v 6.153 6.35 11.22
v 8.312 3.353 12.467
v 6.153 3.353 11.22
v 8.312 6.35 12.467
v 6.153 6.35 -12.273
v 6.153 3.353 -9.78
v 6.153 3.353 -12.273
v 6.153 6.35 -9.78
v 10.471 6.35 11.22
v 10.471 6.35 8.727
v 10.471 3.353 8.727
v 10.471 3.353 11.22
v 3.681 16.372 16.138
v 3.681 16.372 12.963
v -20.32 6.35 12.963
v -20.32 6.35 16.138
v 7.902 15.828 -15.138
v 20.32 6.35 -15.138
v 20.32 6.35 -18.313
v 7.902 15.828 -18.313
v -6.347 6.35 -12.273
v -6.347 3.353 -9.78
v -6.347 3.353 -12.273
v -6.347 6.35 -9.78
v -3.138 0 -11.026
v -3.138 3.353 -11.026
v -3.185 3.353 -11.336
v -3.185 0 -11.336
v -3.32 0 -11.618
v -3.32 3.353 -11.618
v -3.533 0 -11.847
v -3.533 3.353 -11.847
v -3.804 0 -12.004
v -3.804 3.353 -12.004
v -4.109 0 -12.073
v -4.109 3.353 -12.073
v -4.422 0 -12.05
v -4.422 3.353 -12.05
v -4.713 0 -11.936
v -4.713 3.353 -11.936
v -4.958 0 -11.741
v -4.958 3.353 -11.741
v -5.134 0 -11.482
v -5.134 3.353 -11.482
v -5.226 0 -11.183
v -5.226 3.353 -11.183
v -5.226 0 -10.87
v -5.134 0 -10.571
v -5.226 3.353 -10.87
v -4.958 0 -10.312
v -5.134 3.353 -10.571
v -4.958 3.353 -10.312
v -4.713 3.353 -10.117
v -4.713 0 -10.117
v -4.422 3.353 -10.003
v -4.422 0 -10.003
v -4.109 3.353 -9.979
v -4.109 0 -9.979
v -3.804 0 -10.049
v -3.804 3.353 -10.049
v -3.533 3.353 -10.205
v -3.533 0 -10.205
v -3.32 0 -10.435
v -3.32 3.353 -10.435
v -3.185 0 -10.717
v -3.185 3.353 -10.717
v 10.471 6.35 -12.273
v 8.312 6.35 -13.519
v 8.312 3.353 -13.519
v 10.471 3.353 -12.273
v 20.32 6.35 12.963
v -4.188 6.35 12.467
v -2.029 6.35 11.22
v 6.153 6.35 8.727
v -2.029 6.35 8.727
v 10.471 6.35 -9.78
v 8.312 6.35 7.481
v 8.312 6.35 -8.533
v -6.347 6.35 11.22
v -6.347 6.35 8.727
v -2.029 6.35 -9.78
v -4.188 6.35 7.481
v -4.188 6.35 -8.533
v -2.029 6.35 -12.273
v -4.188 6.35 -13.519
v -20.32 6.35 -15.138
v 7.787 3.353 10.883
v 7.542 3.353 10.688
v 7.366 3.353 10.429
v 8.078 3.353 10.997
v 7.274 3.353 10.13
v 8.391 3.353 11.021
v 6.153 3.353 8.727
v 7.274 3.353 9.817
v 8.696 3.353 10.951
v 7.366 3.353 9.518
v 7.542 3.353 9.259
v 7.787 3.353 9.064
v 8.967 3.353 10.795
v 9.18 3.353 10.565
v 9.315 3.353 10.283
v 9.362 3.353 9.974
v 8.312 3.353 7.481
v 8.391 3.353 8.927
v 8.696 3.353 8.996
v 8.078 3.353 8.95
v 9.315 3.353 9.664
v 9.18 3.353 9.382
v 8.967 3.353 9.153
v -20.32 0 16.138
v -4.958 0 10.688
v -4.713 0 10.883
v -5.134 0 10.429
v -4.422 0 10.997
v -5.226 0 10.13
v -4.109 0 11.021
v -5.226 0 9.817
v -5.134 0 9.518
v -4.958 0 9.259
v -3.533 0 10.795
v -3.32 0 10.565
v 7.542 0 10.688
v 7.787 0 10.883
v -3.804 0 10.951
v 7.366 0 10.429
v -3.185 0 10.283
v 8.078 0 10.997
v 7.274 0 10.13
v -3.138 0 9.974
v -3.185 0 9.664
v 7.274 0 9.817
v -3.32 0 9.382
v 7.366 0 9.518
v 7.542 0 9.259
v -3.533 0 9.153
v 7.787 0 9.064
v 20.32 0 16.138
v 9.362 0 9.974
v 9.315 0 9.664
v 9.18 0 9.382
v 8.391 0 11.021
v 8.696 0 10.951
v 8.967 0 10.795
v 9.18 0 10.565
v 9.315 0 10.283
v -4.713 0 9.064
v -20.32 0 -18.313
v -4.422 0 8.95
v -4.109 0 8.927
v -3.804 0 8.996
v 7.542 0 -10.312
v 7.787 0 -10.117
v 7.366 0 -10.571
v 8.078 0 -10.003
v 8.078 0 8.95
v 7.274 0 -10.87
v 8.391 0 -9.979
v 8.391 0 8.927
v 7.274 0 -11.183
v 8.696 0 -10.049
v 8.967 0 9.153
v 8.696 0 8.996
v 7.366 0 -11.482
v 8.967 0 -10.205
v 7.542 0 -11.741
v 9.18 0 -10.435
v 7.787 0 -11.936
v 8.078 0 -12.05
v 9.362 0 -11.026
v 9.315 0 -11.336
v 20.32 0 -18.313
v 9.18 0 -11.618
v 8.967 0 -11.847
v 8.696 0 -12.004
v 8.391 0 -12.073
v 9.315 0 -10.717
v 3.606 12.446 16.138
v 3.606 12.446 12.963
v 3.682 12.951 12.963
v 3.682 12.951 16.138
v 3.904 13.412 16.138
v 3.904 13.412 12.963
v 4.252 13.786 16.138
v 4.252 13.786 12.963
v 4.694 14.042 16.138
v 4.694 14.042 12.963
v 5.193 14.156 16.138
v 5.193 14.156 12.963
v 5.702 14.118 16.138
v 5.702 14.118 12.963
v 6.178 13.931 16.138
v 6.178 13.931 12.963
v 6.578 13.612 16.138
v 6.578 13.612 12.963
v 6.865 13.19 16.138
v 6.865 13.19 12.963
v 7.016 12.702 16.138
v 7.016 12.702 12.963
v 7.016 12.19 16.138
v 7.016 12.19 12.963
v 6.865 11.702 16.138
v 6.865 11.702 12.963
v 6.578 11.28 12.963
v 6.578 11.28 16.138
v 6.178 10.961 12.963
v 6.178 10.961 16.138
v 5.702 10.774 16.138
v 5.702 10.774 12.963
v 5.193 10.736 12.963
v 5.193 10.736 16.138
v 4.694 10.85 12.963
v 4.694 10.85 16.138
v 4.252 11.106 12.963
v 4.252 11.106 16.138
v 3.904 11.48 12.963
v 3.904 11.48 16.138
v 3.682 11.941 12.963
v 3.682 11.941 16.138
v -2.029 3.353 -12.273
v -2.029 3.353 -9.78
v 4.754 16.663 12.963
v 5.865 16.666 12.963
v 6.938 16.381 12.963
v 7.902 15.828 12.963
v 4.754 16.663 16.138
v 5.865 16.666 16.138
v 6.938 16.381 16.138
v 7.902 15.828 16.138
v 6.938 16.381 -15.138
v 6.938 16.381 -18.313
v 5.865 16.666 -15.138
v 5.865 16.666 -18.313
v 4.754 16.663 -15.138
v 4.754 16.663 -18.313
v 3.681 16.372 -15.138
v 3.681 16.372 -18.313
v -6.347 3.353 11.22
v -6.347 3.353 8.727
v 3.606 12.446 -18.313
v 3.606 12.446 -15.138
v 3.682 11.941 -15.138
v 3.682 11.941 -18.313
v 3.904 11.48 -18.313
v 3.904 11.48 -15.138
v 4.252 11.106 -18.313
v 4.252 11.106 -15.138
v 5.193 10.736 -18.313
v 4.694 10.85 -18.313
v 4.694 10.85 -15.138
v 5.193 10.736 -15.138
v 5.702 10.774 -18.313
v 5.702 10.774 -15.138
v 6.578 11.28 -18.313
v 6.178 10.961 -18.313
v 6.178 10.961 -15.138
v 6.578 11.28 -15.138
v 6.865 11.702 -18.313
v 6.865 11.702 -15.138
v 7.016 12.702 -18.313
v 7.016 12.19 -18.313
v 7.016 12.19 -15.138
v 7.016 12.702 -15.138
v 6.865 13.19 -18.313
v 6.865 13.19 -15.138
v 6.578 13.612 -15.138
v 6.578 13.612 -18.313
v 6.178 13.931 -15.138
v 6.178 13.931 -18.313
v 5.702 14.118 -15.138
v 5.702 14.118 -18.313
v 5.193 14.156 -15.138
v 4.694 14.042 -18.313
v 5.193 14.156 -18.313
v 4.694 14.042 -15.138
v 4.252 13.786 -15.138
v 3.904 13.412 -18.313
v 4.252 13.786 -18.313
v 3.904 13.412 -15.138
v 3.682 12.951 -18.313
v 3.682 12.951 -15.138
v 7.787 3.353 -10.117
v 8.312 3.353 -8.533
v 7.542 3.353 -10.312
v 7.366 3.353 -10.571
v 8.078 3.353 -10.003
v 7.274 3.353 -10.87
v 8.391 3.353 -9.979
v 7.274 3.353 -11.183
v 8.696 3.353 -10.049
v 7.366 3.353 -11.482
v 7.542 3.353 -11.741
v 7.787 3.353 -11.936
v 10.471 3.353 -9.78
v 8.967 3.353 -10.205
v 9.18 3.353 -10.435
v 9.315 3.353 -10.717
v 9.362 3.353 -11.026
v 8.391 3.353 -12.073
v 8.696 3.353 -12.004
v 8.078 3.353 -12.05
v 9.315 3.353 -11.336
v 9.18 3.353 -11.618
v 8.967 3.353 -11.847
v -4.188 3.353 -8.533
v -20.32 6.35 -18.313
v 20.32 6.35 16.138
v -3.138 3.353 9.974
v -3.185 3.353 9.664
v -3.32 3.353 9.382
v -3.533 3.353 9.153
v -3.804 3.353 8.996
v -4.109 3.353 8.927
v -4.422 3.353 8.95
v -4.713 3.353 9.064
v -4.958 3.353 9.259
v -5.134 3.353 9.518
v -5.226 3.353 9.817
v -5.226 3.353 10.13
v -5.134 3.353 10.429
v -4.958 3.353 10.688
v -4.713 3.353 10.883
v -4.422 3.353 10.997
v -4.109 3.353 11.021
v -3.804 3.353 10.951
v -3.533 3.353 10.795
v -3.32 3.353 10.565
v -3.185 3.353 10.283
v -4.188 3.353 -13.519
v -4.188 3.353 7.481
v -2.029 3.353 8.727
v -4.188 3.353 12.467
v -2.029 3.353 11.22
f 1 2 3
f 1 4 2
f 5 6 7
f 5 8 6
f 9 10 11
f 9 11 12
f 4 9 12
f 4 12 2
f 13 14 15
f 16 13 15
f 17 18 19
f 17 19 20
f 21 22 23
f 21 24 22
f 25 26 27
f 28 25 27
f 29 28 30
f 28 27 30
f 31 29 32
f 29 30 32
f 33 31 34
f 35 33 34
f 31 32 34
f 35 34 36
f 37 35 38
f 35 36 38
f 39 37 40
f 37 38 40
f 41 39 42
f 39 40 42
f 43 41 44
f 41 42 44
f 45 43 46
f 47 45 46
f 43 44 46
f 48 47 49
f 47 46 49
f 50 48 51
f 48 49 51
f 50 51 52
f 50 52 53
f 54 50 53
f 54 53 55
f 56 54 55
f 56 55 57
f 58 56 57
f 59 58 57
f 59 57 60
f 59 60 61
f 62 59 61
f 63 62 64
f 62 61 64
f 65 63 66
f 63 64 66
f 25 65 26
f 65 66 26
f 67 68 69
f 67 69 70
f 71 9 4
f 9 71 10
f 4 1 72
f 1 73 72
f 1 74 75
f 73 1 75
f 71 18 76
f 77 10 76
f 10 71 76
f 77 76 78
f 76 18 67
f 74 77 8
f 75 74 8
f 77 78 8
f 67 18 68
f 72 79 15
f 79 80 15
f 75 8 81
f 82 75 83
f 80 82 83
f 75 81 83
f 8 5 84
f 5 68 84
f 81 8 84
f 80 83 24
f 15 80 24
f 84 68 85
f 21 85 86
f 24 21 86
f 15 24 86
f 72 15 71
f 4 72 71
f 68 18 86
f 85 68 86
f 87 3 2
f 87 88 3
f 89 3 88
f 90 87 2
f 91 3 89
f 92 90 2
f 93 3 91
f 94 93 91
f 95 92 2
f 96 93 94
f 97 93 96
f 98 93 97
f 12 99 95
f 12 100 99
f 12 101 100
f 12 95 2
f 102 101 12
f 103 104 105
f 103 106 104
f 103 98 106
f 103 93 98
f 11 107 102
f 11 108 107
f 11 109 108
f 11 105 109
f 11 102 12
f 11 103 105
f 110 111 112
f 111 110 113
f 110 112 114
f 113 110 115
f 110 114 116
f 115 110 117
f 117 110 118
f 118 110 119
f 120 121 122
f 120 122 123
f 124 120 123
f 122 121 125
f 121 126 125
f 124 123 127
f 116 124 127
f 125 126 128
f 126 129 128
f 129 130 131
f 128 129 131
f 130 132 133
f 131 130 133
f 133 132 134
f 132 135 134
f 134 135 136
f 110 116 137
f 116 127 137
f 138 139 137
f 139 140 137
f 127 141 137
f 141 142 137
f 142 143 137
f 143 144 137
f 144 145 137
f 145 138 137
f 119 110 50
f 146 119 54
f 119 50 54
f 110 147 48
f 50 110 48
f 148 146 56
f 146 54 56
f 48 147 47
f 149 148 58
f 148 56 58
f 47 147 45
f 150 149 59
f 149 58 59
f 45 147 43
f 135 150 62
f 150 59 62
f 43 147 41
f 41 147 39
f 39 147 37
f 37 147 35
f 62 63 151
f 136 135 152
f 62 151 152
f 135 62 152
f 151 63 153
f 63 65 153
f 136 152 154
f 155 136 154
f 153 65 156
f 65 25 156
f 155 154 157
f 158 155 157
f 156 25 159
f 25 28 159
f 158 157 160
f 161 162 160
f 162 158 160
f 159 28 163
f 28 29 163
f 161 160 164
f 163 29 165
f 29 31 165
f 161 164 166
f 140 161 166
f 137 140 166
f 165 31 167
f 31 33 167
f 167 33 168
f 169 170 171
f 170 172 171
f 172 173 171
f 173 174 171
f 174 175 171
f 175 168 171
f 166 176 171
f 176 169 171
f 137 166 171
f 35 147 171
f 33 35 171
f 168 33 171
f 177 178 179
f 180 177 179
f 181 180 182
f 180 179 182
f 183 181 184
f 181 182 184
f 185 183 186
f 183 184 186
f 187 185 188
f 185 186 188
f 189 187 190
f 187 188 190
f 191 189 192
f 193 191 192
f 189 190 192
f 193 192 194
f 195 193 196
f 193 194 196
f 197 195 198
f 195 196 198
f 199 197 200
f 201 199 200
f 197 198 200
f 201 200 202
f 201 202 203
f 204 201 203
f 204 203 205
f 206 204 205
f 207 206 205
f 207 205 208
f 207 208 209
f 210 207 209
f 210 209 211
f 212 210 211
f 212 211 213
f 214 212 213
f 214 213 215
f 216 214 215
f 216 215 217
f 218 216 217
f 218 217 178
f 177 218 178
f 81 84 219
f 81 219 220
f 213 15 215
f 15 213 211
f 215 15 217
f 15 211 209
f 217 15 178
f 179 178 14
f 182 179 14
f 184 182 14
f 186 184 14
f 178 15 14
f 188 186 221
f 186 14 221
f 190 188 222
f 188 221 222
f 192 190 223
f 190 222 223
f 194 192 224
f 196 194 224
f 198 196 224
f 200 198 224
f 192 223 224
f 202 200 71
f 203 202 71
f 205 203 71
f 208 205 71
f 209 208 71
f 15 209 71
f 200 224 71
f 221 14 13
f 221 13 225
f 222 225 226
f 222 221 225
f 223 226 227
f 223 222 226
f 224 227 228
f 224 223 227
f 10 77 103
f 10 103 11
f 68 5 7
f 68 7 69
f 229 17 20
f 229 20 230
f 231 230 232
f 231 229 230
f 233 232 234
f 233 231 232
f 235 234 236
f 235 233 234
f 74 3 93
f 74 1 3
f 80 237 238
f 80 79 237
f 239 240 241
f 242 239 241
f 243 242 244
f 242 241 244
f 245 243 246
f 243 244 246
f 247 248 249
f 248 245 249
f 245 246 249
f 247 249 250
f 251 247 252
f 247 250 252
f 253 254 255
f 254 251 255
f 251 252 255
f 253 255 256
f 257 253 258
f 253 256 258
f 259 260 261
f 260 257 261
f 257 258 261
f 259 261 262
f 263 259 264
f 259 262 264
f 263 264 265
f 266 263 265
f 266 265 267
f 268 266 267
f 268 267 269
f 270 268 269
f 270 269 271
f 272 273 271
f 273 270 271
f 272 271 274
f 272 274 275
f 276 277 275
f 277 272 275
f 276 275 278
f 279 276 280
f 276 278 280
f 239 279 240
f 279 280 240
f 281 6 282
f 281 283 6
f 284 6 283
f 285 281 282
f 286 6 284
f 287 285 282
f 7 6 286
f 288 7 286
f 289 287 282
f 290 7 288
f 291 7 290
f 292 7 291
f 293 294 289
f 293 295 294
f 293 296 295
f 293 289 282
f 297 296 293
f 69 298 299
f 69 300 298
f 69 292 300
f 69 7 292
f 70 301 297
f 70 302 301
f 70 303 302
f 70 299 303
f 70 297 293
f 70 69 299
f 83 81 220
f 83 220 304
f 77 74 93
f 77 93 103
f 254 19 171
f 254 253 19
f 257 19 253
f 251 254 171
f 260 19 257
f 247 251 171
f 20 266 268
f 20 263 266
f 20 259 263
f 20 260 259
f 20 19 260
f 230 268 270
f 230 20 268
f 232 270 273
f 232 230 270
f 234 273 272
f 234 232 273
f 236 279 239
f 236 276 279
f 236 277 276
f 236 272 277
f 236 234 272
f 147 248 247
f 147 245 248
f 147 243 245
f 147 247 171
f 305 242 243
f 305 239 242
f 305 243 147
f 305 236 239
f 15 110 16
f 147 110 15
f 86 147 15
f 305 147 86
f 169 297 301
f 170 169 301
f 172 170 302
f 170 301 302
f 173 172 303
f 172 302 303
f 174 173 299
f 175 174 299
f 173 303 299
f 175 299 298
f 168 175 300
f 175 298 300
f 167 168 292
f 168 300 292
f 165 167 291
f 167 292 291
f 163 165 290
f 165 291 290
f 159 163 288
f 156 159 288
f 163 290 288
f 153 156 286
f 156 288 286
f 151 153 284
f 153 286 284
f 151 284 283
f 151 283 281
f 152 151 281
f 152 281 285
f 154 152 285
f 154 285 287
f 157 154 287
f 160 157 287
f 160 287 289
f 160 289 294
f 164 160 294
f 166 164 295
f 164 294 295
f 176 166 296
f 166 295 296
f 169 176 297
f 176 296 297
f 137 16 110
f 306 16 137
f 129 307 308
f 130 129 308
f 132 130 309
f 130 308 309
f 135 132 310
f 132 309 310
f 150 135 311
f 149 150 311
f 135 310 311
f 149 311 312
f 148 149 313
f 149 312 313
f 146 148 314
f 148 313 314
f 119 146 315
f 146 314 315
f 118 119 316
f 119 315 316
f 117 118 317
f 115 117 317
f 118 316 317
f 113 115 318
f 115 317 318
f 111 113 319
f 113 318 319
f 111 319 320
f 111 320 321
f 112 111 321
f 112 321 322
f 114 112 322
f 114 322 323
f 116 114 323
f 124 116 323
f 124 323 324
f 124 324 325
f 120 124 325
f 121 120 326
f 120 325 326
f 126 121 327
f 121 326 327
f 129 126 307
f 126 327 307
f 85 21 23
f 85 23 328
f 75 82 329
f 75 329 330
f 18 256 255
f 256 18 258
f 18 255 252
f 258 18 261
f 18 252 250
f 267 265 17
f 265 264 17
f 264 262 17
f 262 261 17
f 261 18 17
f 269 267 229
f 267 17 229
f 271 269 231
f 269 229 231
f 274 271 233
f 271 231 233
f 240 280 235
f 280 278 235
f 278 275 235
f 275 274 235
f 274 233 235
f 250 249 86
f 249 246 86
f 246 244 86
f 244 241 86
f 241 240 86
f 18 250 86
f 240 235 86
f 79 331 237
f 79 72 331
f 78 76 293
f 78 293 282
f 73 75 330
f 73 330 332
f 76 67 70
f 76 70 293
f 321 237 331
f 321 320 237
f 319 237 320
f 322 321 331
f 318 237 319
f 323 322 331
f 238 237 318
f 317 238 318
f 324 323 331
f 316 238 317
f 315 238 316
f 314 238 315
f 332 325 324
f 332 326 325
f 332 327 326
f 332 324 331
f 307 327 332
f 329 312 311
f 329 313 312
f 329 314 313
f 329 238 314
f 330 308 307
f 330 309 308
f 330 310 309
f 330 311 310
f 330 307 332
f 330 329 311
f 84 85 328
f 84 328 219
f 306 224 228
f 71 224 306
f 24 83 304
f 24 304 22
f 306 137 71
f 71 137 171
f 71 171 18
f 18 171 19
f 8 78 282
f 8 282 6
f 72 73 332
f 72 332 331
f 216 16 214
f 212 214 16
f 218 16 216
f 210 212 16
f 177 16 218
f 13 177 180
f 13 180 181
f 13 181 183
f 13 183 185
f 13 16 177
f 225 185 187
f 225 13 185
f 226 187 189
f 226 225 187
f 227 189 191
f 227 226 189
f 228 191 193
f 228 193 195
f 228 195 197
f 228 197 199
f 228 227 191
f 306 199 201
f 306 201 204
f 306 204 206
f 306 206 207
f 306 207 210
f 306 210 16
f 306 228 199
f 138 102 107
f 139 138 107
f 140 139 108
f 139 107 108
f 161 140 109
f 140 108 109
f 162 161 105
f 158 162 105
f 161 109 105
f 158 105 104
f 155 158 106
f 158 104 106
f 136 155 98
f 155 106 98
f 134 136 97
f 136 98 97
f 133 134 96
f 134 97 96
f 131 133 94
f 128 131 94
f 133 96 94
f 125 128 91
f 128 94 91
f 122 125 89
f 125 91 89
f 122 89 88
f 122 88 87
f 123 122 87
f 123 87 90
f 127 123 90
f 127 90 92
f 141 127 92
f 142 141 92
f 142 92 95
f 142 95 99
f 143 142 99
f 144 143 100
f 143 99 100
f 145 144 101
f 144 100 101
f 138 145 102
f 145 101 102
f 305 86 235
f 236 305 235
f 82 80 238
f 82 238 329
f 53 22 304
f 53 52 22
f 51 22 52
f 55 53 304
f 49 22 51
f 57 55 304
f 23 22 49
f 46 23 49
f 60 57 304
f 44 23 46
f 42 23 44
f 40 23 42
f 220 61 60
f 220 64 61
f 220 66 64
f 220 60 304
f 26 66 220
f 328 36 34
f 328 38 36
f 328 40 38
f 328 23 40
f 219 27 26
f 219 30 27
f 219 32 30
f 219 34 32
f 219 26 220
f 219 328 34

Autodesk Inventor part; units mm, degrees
sketch "Sketch1" plane through (0, 0, 0) normal (0, 1, 0) x (-1, 0, 0)
  line L0 (-20.32, 15.1384) -> (-20.32, -15.1384)
  line L1 (-20.32, -15.1384) -> (20.32, -15.1384)
  line L2 (20.32, -15.1384) -> (20.32, 15.1384)
  line L3 (20.32, 15.1384) -> (-20.32, -15.1384) construction
  line L4 (-20.32, 15.1384) -> (20.32, -15.1384) construction
  line L5 (20.32, 15.1384) -> (-20.32, 15.1384)
  point P0 (0, 0)
  dimension "d9" = 30.2768
  dimension "d23" = 40.64
extrude "Extrusion1" add sketch "Sketch1" along normal blind 6.35
sketch "Sketch3" plane through (-20.32, 0, 15.1384) normal (0, 0, 1) x (1, 0, 0)
  point P0 (20.32, 0)
  point P1 (0, 0)
sketch "Sketch4" plane through (20.32, 0, -15.1384) normal (0, 0, -1) x (-1, 0, 0)
  line L0 (0, 0) -> (0, 6.35)
  line L1 (0, 6.35) -> (12.418, 15.828)
  line L2 (40.64, 0) -> (40.64, 6.35)
  line L3 (40.64, 6.35) -> (16.6386, 16.372)
  arc A0 (16.6386, 16.372) -> (12.418, 15.828) centre (14.9993, 12.446) ccw
  line L4 (40.64, 0) -> (0, 0)
  circle A1 centre (14.9993, 12.446) radius 1.7145
  circle A2 centre (14.9993, 12.446) radius 2.4511 projected
  point P0 (20.32, 0)
  dimension "d14" = 3.429
  dimension "d24" = 2.54
ref_plane "Work Plane5" through (-20.32, 0, 18.3236) normal (0, 0, 1) x (1, 0, 0)
extrude "Extrusion6" add sketch "Sketch4" along normal blind 3.175 contours L0 L1 A0 L3 L2 L4 | A2
sketch "Sketch6" plane through (0, 6.35, 0) normal (0, 1, 0) x (1, 0, 0)
  circle A0 centre (-4.1879, -9.9736) radius 1.05 projected
  circle A1 centre (8.3121, -9.9736) radius 1.05 projected
  circle A2 centre (8.3121, 11.0264) radius 1.05 projected
  circle A3 centre (-4.1879, 11.0264) radius 1.05 projected
  point P0 (0, 0)
extrude "Extrusion7" cut sketch "Sketch6" against normal up to next
ref_plane "Work Plane4" through (-20.32, 0, 18.3236) normal (0, 0, 1) x (1, 0, 0)
sketch "Sketch13" plane through (0, 6.35, 0) normal (0, 1, 0) x (1, 0, 0)
  circle A0 centre (-4.1879, 11.0264) radius 1.05
  line L0 (-2.0289, 9.7799) -> (-4.1879, 8.5334)
  line L1 (-4.1879, 8.5334) -> (-6.3469, 9.7799)
  line L2 (-6.3469, 9.7799) -> (-6.3469, 12.2729)
  line L3 (-6.3469, 12.2729) -> (-4.1879, 13.5194)
  line L4 (-4.1879, 13.5194) -> (-2.0289, 12.2729)
  line L5 (-2.0289, 12.2729) -> (-2.0289, 9.7799)
  circle A1 centre (8.3121, 11.0264) radius 1.05
  line L6 (10.4711, 9.7799) -> (8.3121, 8.5334)
  line L7 (8.3121, 8.5334) -> (6.1531, 9.7799)
  line L8 (6.1531, 9.7799) -> (6.1531, 12.2729)
  line L9 (6.1531, 12.2729) -> (8.3121, 13.5194)
  line L10 (8.3121, 13.5194) -> (10.4711, 12.2729)
  line L11 (10.4711, 12.2729) -> (10.4711, 9.7799)
  circle A2 centre (-4.1879, -9.9736) radius 1.05
  line L12 (-2.0289, -11.2201) -> (-4.1879, -12.4666)
  line L13 (-4.1879, -12.4666) -> (-6.3469, -11.2201)
  line L14 (-6.3469, -11.2201) -> (-6.3469, -8.7271)
  line L15 (-6.3469, -8.7271) -> (-4.1879, -7.4806)
  line L16 (-4.1879, -7.4806) -> (-2.0289, -8.7271)
  line L17 (-2.0289, -8.7271) -> (-2.0289, -11.2201)
  circle A3 centre (8.3121, -9.9736) radius 1.05
  line L18 (10.4711, -11.2201) -> (8.3121, -12.4666)
  line L19 (8.3121, -12.4666) -> (6.1531, -11.2201)
  line L20 (6.1531, -11.2201) -> (6.1531, -8.7271)
  line L21 (6.1531, -8.7271) -> (8.3121, -7.4806)
  line L22 (8.3121, -7.4806) -> (10.4711, -8.7271)
  line L23 (10.4711, -8.7271) -> (10.4711, -11.2201)
  line L24 (-20.32, 15.1384) -> (-20.32, -15.1384) projected
  circle A4 centre (0, 0) radius 1.7967
extrude "Extrusion12" cut sketch "Sketch13" against normal blind 2.9972 contours L0 L1 L2 L3 L4 L5 | L6 L7 L8 L9 L10 L11 | L12 L13 L14 L15 L16 L17 | L18 L19 L20 L21 L22 L23
ref_plane "Work Plane2" through (-20.32, 0, 18.3236) normal (0, 0, 1) x (1, 0, 0)
ref_plane "Work Plane7" through (-20.32, 0, -1.5875) normal (0, 0, 1) x (1, 0, 0)
sketch "Sketch17" plane through (-20.32, 0, 15.1384) normal (0, 0, 1) x (1, 0, 0)
  line L0 (0, 0) -> (0, 6.35) projected
  line L1 (40.64, 6.35) -> (0, 6.35) projected
  line L2 (0, 0) -> (40.64, 0)
  line L3 (40.64, 0) -> (40.64, 6.35)
  line L4 (40.64, 6.35) -> (0, 6.35)
  line L5 (0, 6.35) -> (0, 0)
  point P0 (20.32, 0)
extrude "Extrusion16" add sketch "Sketch17" along normal blind 1
ref_plane "Work Plane9" through (-20.32, 0, -1.0877) normal (0, 0, 1) x (1, 0, 0)
mirror "Mirror2" about plane through (-20.32, 0, -1.0877) normal (0, 0, 1) of "Extrusion6"
properties part number "CameraMount" material "ABS Plastic"
